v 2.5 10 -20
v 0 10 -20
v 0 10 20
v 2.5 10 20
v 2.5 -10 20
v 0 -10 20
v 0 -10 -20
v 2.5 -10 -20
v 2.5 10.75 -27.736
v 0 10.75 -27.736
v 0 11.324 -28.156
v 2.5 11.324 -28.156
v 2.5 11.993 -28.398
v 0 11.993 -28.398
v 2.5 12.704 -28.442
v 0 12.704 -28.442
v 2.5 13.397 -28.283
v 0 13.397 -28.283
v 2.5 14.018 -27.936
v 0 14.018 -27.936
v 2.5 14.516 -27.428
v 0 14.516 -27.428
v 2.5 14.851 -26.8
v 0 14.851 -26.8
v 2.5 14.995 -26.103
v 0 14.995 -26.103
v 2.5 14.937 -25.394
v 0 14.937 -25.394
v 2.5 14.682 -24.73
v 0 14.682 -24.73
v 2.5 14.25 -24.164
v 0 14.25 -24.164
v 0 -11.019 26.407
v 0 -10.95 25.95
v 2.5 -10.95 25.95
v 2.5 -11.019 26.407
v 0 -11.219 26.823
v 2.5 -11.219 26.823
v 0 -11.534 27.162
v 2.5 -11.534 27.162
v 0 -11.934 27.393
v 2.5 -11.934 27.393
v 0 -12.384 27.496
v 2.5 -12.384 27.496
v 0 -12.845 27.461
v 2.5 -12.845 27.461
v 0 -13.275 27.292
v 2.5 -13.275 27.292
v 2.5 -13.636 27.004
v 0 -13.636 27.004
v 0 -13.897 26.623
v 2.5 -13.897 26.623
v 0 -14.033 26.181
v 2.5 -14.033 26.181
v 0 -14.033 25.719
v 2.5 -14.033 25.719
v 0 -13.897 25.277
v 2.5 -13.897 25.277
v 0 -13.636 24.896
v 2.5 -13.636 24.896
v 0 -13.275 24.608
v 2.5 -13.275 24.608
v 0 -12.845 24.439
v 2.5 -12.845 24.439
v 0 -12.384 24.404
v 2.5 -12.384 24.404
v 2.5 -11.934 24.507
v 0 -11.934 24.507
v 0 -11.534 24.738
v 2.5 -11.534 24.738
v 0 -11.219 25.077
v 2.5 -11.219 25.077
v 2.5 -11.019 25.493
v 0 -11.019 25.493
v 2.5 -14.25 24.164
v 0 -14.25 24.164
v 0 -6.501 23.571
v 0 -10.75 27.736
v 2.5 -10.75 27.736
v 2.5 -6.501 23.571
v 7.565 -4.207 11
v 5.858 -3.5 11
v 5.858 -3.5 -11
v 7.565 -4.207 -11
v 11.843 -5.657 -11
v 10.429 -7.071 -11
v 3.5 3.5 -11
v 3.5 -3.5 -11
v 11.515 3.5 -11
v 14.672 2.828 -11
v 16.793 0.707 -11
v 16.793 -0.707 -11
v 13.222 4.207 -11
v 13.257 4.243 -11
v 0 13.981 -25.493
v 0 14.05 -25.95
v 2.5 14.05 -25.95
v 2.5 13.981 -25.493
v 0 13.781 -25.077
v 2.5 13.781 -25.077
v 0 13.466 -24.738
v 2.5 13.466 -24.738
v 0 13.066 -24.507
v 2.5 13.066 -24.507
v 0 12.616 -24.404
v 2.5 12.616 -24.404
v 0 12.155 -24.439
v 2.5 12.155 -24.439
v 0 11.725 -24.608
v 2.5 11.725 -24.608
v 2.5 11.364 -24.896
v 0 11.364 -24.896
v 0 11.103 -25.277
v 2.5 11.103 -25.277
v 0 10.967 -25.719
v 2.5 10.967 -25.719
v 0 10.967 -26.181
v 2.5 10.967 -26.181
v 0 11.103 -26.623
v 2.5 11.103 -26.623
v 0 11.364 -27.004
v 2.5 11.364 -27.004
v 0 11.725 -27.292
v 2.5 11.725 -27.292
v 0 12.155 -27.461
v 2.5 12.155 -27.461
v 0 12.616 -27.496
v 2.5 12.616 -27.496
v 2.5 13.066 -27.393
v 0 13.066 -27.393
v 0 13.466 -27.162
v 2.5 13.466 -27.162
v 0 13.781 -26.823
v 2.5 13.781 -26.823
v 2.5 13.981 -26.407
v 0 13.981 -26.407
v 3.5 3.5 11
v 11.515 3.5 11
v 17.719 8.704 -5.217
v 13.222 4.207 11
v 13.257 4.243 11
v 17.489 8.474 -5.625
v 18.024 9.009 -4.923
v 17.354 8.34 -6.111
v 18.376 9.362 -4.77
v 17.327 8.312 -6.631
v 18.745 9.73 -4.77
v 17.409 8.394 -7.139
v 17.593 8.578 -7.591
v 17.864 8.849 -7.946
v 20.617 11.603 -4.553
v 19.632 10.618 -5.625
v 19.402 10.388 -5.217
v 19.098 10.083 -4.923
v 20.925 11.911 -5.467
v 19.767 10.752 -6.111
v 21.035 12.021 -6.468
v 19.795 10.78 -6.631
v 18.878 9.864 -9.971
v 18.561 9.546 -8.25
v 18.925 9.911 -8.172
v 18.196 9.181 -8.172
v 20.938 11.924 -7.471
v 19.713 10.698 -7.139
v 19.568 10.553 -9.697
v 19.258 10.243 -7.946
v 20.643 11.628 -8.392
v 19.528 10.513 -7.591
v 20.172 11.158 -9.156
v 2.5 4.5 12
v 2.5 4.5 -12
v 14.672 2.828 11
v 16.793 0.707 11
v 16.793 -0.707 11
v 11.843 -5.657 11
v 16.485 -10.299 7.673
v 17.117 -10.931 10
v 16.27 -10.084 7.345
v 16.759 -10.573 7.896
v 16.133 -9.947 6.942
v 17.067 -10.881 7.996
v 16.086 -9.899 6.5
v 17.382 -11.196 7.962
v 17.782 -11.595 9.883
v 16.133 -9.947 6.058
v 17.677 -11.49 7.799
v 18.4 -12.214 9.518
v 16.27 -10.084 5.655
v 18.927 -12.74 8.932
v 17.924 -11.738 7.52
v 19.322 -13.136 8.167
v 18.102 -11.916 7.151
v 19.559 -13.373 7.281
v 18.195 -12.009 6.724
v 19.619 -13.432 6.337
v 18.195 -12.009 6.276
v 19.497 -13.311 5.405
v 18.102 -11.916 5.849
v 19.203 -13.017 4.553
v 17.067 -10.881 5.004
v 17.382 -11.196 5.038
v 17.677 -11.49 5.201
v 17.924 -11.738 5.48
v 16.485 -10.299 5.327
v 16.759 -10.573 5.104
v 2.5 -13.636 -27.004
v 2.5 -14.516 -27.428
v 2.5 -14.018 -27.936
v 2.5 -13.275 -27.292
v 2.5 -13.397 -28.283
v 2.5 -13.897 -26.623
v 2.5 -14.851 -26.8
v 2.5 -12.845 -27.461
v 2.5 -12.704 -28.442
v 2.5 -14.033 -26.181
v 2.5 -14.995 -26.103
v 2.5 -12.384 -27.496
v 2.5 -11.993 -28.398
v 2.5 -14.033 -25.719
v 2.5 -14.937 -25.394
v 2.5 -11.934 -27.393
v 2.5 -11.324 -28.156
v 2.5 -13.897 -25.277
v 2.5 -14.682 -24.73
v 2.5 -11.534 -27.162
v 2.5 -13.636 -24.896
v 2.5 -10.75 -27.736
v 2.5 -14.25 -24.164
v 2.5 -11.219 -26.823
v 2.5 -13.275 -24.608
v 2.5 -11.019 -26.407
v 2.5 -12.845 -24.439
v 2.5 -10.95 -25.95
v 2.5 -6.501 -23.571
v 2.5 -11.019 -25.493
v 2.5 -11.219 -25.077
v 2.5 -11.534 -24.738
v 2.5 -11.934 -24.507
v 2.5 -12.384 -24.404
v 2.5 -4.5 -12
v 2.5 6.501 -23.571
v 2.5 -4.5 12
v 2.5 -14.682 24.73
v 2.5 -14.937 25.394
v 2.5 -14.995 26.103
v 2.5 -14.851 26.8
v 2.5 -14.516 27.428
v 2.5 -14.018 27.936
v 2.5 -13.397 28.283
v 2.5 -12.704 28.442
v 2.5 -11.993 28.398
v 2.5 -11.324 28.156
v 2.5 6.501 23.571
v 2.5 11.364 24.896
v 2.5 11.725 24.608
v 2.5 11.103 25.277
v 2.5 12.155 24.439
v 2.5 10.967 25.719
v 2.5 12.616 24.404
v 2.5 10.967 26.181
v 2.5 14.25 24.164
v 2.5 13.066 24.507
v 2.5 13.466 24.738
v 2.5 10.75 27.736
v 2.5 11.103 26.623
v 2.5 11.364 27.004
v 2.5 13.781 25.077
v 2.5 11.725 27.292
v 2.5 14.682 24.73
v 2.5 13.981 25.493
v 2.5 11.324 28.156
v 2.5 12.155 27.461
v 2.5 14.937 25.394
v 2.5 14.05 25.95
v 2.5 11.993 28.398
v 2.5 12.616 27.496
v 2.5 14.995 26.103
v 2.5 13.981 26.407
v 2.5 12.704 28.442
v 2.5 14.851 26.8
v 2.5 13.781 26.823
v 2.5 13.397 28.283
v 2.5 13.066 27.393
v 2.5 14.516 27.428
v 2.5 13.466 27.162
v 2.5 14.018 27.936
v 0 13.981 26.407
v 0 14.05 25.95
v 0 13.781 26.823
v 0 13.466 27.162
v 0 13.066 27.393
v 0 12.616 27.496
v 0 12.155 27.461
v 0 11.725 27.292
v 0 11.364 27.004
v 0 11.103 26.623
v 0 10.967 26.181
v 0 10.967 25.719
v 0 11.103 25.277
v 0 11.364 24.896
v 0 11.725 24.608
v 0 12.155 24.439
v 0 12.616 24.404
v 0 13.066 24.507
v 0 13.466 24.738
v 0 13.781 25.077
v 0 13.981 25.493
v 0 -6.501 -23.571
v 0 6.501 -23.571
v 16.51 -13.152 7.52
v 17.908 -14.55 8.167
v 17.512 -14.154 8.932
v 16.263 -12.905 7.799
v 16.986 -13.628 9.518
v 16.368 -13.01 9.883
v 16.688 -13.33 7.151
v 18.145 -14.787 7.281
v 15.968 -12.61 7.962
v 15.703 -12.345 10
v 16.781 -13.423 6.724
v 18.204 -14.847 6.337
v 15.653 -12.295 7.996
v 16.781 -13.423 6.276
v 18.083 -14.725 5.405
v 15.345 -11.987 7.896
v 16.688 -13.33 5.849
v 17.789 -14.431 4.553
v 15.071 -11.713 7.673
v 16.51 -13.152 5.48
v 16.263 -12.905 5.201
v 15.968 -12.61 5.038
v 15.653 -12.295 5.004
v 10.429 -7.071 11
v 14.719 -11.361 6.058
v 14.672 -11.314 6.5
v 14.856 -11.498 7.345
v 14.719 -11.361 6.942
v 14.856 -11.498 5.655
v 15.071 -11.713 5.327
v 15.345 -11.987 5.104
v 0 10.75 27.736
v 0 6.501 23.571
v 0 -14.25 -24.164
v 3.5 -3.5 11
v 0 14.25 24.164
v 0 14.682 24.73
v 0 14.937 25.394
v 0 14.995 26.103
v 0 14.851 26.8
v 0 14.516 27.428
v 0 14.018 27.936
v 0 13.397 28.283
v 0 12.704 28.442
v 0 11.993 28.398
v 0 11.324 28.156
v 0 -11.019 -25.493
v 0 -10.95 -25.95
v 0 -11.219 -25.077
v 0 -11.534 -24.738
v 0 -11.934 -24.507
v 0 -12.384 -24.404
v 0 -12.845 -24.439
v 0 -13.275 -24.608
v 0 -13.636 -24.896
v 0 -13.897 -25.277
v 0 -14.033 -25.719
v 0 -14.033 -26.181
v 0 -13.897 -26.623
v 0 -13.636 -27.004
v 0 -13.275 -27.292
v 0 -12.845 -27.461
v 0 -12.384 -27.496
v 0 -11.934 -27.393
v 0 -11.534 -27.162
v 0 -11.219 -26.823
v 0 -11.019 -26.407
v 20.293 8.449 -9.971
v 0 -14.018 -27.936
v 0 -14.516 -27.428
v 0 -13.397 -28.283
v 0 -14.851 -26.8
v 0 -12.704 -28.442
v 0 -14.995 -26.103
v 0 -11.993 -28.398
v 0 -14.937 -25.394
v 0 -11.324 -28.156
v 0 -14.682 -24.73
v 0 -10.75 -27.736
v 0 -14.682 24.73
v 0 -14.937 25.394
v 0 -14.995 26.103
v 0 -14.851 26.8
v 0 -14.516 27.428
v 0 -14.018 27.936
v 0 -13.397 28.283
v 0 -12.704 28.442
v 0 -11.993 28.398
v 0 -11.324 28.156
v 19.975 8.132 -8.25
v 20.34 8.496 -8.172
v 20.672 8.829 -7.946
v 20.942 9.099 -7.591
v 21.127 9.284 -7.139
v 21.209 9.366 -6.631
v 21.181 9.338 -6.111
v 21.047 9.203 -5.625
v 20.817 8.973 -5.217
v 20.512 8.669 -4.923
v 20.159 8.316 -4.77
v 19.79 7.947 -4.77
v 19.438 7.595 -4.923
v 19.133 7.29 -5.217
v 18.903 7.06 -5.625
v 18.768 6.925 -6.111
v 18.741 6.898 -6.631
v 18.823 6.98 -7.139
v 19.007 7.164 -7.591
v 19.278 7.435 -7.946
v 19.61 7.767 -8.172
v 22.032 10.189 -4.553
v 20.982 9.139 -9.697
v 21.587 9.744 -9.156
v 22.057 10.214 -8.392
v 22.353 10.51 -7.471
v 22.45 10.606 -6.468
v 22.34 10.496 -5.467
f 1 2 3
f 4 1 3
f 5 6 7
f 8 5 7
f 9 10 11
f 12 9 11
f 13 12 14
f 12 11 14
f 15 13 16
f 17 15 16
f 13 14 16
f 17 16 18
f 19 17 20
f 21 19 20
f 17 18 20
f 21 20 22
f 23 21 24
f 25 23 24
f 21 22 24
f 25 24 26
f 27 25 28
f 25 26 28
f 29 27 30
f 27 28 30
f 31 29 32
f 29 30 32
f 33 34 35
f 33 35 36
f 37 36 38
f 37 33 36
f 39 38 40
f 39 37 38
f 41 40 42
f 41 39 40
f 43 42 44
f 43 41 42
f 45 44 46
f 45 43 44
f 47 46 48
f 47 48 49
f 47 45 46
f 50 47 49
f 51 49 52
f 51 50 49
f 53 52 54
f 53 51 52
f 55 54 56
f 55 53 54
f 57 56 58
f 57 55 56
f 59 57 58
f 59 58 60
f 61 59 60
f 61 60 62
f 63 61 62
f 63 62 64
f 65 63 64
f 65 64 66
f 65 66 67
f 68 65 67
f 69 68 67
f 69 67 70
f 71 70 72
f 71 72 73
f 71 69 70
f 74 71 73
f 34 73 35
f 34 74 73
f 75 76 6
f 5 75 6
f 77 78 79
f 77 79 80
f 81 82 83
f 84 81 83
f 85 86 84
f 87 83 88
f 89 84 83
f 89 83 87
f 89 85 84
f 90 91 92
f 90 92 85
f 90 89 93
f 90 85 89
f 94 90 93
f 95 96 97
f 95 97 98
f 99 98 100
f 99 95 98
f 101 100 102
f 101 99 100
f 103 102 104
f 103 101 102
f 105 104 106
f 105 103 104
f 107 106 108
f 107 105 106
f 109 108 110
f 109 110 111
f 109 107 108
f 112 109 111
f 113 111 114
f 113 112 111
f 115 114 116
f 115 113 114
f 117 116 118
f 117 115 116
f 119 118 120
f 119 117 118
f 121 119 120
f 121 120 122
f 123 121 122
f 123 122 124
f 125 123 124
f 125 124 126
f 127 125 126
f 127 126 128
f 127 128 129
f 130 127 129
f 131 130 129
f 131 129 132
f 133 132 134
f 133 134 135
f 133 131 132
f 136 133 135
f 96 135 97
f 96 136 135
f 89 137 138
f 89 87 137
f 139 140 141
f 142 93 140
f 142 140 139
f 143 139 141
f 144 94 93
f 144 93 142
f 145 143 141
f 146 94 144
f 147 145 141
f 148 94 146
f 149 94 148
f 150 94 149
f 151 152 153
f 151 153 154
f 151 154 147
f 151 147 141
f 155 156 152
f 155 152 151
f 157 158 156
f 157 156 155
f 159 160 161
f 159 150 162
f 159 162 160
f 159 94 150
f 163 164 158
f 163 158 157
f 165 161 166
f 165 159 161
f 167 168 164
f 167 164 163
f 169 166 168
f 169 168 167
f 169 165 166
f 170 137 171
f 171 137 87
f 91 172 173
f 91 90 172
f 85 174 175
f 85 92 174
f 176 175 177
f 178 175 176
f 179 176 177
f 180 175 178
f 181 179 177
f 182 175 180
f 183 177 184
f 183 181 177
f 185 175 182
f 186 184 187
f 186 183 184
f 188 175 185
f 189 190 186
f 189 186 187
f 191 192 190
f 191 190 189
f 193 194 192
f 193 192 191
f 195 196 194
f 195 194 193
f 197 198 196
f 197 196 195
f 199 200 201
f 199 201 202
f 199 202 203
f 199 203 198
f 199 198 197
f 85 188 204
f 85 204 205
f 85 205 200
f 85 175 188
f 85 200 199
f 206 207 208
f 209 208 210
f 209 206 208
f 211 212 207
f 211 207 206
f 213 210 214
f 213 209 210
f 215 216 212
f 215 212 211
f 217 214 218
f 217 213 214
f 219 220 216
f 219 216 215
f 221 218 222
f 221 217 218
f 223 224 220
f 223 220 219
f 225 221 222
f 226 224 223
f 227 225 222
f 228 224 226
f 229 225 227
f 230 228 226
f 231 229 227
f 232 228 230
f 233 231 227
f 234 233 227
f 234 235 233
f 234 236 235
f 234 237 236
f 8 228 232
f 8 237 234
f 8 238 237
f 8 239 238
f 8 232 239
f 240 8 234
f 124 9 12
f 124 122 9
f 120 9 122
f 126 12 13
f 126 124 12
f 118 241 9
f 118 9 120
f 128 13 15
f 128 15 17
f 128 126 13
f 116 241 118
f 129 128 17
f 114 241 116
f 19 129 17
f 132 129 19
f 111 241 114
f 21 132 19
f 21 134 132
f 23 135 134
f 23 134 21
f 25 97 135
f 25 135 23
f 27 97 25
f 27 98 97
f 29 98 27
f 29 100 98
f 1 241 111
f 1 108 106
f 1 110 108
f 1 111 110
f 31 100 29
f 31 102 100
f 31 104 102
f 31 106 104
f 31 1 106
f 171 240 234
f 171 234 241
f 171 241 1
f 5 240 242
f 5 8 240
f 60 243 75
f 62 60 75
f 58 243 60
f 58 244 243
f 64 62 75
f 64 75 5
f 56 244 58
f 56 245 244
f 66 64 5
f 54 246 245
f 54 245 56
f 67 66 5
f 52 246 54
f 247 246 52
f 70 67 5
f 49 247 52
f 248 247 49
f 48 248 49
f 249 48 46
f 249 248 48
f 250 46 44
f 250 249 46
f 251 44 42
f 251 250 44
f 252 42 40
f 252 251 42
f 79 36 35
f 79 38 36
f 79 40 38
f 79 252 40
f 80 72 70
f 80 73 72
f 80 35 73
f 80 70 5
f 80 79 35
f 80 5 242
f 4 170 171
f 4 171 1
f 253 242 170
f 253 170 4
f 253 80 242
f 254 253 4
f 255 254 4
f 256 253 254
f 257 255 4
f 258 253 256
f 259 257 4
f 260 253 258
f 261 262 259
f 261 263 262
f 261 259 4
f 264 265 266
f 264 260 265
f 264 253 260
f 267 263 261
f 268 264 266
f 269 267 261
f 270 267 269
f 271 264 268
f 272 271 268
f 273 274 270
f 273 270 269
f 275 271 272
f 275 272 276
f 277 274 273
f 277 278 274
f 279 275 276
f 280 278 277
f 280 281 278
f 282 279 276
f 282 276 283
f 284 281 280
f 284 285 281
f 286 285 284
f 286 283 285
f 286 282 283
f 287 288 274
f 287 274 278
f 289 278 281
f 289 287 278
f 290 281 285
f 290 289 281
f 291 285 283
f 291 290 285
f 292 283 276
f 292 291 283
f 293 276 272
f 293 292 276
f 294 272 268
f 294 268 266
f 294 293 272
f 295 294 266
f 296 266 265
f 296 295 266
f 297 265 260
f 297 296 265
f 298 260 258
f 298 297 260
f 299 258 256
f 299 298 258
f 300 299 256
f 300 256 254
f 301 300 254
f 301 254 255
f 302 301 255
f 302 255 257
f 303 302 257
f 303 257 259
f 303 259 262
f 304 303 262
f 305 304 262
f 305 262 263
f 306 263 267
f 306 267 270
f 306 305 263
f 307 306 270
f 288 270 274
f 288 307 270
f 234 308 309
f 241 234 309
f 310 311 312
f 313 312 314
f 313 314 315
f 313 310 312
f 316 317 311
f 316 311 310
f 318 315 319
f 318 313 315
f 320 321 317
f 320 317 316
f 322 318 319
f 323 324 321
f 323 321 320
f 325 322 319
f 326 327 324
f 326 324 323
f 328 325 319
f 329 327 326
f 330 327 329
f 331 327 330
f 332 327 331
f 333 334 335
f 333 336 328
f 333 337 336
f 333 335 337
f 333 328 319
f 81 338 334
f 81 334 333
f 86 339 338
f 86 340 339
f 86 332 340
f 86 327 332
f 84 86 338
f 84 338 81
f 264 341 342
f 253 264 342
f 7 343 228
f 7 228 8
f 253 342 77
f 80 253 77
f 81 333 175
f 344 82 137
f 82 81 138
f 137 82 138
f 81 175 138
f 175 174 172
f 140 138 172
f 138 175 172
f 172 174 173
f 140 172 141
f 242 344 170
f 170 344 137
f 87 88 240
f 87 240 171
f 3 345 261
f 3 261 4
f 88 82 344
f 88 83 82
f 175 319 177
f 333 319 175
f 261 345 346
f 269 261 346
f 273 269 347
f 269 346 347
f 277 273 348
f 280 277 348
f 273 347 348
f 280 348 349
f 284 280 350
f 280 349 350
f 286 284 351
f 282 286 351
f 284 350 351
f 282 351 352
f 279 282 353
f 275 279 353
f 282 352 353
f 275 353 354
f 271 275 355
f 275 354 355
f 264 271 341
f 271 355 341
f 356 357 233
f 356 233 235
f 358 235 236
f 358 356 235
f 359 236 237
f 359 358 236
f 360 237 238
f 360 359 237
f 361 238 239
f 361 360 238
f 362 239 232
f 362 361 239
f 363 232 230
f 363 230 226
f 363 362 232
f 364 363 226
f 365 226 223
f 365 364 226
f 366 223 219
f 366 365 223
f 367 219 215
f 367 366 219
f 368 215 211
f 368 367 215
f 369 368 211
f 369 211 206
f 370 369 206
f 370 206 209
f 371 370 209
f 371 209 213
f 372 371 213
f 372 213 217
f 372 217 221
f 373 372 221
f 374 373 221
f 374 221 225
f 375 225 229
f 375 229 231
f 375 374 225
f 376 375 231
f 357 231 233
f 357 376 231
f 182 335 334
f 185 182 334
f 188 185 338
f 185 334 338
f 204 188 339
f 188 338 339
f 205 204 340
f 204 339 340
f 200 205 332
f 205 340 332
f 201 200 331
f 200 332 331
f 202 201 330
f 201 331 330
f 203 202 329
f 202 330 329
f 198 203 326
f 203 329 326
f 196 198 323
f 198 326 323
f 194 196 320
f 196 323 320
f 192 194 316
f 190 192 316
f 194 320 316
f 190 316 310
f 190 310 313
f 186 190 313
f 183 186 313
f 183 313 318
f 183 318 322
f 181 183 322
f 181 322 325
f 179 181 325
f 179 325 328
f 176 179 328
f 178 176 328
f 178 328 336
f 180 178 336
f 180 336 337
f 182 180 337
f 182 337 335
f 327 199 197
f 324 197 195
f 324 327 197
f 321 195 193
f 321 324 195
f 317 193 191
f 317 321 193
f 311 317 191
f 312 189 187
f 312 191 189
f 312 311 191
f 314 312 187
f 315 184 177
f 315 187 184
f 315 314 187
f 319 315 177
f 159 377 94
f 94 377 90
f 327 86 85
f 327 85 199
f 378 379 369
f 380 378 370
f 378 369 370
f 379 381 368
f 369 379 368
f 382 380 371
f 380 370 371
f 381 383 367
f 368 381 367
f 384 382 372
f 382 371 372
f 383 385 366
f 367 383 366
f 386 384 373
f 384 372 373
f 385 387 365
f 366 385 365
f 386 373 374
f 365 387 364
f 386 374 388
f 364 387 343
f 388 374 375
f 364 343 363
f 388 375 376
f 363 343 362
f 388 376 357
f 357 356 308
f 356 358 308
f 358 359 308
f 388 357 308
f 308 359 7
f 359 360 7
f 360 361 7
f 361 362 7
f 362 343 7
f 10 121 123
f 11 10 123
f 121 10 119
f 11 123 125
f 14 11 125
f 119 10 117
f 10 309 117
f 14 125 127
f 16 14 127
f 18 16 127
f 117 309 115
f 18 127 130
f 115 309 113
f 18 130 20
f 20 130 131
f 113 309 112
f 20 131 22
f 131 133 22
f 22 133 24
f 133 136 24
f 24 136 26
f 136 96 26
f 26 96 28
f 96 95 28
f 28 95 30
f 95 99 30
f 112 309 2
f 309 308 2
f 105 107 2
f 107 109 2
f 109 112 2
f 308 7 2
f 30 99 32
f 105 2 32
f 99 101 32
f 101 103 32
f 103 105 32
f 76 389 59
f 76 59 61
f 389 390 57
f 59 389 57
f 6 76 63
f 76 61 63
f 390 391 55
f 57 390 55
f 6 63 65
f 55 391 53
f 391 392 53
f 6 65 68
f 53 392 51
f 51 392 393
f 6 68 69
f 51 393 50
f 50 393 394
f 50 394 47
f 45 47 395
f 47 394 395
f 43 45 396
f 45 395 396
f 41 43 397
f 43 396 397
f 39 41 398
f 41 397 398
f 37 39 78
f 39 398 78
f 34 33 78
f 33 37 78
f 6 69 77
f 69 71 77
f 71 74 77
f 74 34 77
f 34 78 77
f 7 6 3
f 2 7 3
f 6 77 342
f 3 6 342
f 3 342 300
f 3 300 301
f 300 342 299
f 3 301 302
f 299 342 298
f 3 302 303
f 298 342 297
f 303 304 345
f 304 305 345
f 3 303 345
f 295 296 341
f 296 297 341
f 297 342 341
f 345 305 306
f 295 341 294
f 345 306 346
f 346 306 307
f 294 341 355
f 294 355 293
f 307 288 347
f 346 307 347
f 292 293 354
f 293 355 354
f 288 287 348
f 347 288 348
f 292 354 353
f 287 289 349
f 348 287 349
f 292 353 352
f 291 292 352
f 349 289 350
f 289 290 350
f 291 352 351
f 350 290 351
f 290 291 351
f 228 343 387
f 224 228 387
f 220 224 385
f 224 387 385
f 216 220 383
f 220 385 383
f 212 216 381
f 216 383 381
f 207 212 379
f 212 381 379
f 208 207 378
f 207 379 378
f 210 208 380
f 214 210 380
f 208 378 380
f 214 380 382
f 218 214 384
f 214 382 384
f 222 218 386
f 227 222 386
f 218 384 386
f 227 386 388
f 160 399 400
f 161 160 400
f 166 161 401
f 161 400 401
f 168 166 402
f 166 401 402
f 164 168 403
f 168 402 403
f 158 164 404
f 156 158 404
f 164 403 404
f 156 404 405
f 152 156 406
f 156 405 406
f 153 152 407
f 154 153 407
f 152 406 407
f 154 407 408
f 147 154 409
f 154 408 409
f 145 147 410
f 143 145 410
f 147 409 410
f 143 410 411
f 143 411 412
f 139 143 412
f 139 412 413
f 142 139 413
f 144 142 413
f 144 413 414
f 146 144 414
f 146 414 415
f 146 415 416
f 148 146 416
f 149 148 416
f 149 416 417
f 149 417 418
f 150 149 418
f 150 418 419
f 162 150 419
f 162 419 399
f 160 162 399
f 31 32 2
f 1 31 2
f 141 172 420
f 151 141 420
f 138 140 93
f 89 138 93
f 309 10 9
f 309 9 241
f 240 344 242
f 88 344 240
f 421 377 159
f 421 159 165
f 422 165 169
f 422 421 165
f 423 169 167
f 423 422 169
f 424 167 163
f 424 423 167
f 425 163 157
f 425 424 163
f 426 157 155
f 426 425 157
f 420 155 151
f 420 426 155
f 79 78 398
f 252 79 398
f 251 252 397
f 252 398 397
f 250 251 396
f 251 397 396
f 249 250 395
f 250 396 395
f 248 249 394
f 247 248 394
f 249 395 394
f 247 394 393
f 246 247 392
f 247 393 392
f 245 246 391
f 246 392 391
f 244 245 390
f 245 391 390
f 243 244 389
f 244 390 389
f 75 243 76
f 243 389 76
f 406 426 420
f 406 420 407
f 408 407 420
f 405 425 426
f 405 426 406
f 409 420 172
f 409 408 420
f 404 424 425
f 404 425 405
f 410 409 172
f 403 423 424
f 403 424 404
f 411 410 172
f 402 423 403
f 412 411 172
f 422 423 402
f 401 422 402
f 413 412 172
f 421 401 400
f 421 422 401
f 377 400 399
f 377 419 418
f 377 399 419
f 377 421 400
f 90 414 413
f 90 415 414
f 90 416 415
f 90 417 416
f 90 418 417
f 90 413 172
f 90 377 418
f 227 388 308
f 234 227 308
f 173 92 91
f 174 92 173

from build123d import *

# Parameters (mm, degrees)
SKETCH170_R     = 1.55
PAD089_DEPTH    = 2.5
PAD090_DEPTH    = 11
SKETCH172_R     = 1.5
POCKET066_DEPTH = 5
SKETCH_R        = 1.75
POCKET_DEPTH    = 5
CHAMFER_SIZE    = 1


with BuildPart() as part:
    # Sketch170 → Pad089 (new body)
    with BuildSketch(Plane.YZ):
        with BuildLine():
            ThreePointArc((-10.7502555542, 27.7356075645), (-14.2856053806, 27.6997466745), (-14.2497489032, 24.1643968034))
            Line((-14.2497489032, 24.1643968034), (-10, 20))
            Line((-10, 20), (-10, 0))
            Line((-10, -20), (-10, 0))
            Line((-14.2497550835, -24.1644028597), (-10, -20))
            ThreePointArc((-14.2497550835, -24.1644028597), (-14.2855992835, -27.6997528965), (-10.7502492905, -27.7356014266))
            Line((-10.7502492905, -27.7356014266), (-6.5005101735, -23.5712142128))
            Line((-6.5005101735, -23.5712142128), (6.5005101735, -23.5712142128))
            Line((10.7502488005, -27.7356009464), (6.5005101735, -23.5712142128))
            ThreePointArc((10.7502488005, -27.7356009464), (14.2856010292, -27.699751115), (14.2497510305, -24.164398888))
            Line((14.2497510305, -24.164398888), (10, -20))
            Line((10, -20), (10, 0))
            Line((10, 20), (10, 0))
            Line((14.2497448501, 24.1643928317), (10, 20))
            ThreePointArc((14.2497448501, 24.1643928317), (14.2856070566, 27.6997449641), (10.7502549219, 27.7356069449))
            Line((10.7502549219, 27.7356069449), (6.5005101735, 23.5712142128))
            Line((6.5005101735, 23.5712142128), (0, 23.5712142128))
            Line((-6.5005101735, 23.5712142128), (0, 23.5712142128))
            Line((-10.7502555542, 27.7356075645), (-6.5005101735, 23.5712142128))
        make_face()
        with Locations((-12.5, 25.95)):
            Circle(SKETCH170_R, mode=Mode.SUBTRACT)
        with Locations((12.5, 25.95)):
            Circle(SKETCH170_R, mode=Mode.SUBTRACT)
        with Locations((-12.5, -25.95)):
            Circle(SKETCH170_R, mode=Mode.SUBTRACT)
        with Locations((12.5, -25.95)):
            Circle(SKETCH170_R, mode=Mode.SUBTRACT)
    extrude(amount=PAD089_DEPTH)

    # Sketch171 (on DatumPlane) → Pad090 (join, symmetric)
    with BuildSketch(Plane(origin=(2.5, 0, 0), x_dir=(0, 1, 0), z_dir=(0, 0, -1))):
        Polygon((-13.4350288425, 17.1213203436), (-14.8492424049, 15.7071067812), (-3.5, 4.3578643763), (-3.5, 0), (3.5, 0), (3.5, 10.0147186258), (12.0208152802, 18.5355339059), (10.6066017178, 19.9497474683), (2.8284271247, 12.1715728753), (0, 15), (-5.6568542495, 9.3431457505), align=None)
    extrude(amount=PAD090_DEPTH, both=True)

    # Sketch172 (on Face30 of Pad090) → Pocket066 (cut)
    with BuildSketch(Plane(origin=(1.6789321881, 1.6789321881, 0), x_dir=(-0.7071067812, 0.7071067812, 0), z_dir=(-0.7071067812, -0.7071067812, 0))):
        with Locations((-19.8743686708, -6.5)):
            Circle(SKETCH172_R)
        with BuildLine():
            ThreePointArc((-22.7830913882, -4.5533792991), (-22.9517672177, -8.1672186969), (-19.8324532872, -9.9997490054))
            Line((-19.8324532872, -9.9997490054), (-12.3743686708, -11))
            Line((-12.3743686708, -11), (-12.3743686708, -12))
            Line((-12.3743686708, -12), (-25.675823, -12))
            Line((-25.675823, -12), (-25.675823, 11.874653))
            Line((-25.675823, 11.874653), (-12.3743686708, 11.874653))
            Line((-12.3743686708, 11.874653), (-12.3743686708, 11))
            Line((-12.3743686708, 11), (-22.7830913882, -4.5533792991))
        make_face()
    extrude(amount=-POCKET066_DEPTH, mode=Mode.SUBTRACT)

    # Sketch (on Face33 of Pocket066) → Pocket (cut)
    with BuildSketch(Plane(origin=(5.9215728753, -5.9215728753, 0), x_dir=(0, 0, -1), z_dir=(0.7071067812, -0.7071067812, 0))):
        with Locations((6.5, 19.8743686708)):
            Circle(SKETCH_R)
        with BuildLine():
            Line((9.9710425685, 20.3236608785), (11, 12.3743686708))
            Line((11, 12.3743686708), (13.188866, 12.3743686708))
            Line((13.188866, 12.3743686708), (13.237601, 26.90383))
            Line((13.237601, 26.90383), (-12.122474, 26.90383))
            Line((-12.122474, 26.90383), (-12.122474, 12.372268))
            Line((-12.122474, 12.372268), (-11, 12.3743686708))
            Line((-11, 12.3743686708), (4.5533989217, 22.7831045202))
            ThreePointArc((9.9710425685, 20.3236608785), (7.9467882433, 23.0613427496), (4.5533989217, 22.7831045202))
        make_face()
    extrude(amount=-POCKET_DEPTH, mode=Mode.SUBTRACT)

    # Chamfer
    chamfer_edges = [part.edges().sort_by_distance(p)[0] for p in [
        (2.5, 0, -11),
        (2.5, 3.5, 0),
        (2.5, -3.5, 0),
        (2.5, 0, 11),
        (6.857864, -3.5, 0),
        (12.514719, 3.5, 0),
        (17.5, 0, 0),
    ]]
    chamfer(chamfer_edges, length=CHAMFER_SIZE)


solid = part.part
